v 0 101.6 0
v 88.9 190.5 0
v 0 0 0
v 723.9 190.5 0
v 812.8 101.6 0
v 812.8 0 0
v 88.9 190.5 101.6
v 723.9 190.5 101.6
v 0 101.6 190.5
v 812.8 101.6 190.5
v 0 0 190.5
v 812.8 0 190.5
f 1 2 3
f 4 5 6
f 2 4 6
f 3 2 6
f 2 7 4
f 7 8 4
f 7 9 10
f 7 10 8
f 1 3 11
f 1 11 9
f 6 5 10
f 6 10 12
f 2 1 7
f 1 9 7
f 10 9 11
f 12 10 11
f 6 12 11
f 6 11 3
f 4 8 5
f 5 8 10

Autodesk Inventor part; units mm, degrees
ref_plane "YZ Plane" through (0, 0, 0) normal (1, 0, 0) x (0, 1, 0)
ref_plane "XZ Plane" through (0, 0, 0) normal (0, 1, 0) x (-1, 0, 0)
ref_plane "XY Plane" through (0, 0, 0) normal (0, 0, 1) x (1, 0, 0)
sketch "Sketch1" plane through (0, 0, 0) normal (1, 0, 0) x (0, 1, 0)
  line L0 (0, 0) -> (190.5, 0)
  line L1 (0, 0) -> (0, 190.5)
  line L2 (0, 190.5) -> (101.6, 190.5)
  line L3 (190.5, 0) -> (190.5, 101.6)
  line L4 (190.5, 101.6) -> (101.6, 190.5)
  dimension "d0" = 190.5
  dimension "d1" = 190.5
  dimension "d2" = 101.6
  dimension "d3" = 101.6
  dimension "d4" = 88.9
  dimension "d5" = 88.9
extrude "Extrusion1" add sketch "Sketch1" along normal blind 406.4
sketch "Sketch2" plane through (0, 0, 190.5) normal (0, 0, 1) x (1, 0, 0)
  line L0 (0, 0) -> (0, 190.5) projected
  line L1 (0, 190.5) -> (88.9, 190.5)
  line L2 (0, 190.5) -> (406.4, 190.5) projected
  line L3 (0, 190.5) -> (0, 101.6)
  line L4 (0, 101.6) -> (88.9, 190.5)
  dimension "d8" = 88.9
  dimension "d9" = 88.9
extrude "Extrusion2" cut sketch "Sketch2" against normal up to surface (190.5 mm away)
mirror "Mirror1" about plane through (406.4, 95.25, 95.25) normal (1, 0, 0) of "Extrusion1", "Extrusion2"
properties part number "Return_L" material "Limestone"
